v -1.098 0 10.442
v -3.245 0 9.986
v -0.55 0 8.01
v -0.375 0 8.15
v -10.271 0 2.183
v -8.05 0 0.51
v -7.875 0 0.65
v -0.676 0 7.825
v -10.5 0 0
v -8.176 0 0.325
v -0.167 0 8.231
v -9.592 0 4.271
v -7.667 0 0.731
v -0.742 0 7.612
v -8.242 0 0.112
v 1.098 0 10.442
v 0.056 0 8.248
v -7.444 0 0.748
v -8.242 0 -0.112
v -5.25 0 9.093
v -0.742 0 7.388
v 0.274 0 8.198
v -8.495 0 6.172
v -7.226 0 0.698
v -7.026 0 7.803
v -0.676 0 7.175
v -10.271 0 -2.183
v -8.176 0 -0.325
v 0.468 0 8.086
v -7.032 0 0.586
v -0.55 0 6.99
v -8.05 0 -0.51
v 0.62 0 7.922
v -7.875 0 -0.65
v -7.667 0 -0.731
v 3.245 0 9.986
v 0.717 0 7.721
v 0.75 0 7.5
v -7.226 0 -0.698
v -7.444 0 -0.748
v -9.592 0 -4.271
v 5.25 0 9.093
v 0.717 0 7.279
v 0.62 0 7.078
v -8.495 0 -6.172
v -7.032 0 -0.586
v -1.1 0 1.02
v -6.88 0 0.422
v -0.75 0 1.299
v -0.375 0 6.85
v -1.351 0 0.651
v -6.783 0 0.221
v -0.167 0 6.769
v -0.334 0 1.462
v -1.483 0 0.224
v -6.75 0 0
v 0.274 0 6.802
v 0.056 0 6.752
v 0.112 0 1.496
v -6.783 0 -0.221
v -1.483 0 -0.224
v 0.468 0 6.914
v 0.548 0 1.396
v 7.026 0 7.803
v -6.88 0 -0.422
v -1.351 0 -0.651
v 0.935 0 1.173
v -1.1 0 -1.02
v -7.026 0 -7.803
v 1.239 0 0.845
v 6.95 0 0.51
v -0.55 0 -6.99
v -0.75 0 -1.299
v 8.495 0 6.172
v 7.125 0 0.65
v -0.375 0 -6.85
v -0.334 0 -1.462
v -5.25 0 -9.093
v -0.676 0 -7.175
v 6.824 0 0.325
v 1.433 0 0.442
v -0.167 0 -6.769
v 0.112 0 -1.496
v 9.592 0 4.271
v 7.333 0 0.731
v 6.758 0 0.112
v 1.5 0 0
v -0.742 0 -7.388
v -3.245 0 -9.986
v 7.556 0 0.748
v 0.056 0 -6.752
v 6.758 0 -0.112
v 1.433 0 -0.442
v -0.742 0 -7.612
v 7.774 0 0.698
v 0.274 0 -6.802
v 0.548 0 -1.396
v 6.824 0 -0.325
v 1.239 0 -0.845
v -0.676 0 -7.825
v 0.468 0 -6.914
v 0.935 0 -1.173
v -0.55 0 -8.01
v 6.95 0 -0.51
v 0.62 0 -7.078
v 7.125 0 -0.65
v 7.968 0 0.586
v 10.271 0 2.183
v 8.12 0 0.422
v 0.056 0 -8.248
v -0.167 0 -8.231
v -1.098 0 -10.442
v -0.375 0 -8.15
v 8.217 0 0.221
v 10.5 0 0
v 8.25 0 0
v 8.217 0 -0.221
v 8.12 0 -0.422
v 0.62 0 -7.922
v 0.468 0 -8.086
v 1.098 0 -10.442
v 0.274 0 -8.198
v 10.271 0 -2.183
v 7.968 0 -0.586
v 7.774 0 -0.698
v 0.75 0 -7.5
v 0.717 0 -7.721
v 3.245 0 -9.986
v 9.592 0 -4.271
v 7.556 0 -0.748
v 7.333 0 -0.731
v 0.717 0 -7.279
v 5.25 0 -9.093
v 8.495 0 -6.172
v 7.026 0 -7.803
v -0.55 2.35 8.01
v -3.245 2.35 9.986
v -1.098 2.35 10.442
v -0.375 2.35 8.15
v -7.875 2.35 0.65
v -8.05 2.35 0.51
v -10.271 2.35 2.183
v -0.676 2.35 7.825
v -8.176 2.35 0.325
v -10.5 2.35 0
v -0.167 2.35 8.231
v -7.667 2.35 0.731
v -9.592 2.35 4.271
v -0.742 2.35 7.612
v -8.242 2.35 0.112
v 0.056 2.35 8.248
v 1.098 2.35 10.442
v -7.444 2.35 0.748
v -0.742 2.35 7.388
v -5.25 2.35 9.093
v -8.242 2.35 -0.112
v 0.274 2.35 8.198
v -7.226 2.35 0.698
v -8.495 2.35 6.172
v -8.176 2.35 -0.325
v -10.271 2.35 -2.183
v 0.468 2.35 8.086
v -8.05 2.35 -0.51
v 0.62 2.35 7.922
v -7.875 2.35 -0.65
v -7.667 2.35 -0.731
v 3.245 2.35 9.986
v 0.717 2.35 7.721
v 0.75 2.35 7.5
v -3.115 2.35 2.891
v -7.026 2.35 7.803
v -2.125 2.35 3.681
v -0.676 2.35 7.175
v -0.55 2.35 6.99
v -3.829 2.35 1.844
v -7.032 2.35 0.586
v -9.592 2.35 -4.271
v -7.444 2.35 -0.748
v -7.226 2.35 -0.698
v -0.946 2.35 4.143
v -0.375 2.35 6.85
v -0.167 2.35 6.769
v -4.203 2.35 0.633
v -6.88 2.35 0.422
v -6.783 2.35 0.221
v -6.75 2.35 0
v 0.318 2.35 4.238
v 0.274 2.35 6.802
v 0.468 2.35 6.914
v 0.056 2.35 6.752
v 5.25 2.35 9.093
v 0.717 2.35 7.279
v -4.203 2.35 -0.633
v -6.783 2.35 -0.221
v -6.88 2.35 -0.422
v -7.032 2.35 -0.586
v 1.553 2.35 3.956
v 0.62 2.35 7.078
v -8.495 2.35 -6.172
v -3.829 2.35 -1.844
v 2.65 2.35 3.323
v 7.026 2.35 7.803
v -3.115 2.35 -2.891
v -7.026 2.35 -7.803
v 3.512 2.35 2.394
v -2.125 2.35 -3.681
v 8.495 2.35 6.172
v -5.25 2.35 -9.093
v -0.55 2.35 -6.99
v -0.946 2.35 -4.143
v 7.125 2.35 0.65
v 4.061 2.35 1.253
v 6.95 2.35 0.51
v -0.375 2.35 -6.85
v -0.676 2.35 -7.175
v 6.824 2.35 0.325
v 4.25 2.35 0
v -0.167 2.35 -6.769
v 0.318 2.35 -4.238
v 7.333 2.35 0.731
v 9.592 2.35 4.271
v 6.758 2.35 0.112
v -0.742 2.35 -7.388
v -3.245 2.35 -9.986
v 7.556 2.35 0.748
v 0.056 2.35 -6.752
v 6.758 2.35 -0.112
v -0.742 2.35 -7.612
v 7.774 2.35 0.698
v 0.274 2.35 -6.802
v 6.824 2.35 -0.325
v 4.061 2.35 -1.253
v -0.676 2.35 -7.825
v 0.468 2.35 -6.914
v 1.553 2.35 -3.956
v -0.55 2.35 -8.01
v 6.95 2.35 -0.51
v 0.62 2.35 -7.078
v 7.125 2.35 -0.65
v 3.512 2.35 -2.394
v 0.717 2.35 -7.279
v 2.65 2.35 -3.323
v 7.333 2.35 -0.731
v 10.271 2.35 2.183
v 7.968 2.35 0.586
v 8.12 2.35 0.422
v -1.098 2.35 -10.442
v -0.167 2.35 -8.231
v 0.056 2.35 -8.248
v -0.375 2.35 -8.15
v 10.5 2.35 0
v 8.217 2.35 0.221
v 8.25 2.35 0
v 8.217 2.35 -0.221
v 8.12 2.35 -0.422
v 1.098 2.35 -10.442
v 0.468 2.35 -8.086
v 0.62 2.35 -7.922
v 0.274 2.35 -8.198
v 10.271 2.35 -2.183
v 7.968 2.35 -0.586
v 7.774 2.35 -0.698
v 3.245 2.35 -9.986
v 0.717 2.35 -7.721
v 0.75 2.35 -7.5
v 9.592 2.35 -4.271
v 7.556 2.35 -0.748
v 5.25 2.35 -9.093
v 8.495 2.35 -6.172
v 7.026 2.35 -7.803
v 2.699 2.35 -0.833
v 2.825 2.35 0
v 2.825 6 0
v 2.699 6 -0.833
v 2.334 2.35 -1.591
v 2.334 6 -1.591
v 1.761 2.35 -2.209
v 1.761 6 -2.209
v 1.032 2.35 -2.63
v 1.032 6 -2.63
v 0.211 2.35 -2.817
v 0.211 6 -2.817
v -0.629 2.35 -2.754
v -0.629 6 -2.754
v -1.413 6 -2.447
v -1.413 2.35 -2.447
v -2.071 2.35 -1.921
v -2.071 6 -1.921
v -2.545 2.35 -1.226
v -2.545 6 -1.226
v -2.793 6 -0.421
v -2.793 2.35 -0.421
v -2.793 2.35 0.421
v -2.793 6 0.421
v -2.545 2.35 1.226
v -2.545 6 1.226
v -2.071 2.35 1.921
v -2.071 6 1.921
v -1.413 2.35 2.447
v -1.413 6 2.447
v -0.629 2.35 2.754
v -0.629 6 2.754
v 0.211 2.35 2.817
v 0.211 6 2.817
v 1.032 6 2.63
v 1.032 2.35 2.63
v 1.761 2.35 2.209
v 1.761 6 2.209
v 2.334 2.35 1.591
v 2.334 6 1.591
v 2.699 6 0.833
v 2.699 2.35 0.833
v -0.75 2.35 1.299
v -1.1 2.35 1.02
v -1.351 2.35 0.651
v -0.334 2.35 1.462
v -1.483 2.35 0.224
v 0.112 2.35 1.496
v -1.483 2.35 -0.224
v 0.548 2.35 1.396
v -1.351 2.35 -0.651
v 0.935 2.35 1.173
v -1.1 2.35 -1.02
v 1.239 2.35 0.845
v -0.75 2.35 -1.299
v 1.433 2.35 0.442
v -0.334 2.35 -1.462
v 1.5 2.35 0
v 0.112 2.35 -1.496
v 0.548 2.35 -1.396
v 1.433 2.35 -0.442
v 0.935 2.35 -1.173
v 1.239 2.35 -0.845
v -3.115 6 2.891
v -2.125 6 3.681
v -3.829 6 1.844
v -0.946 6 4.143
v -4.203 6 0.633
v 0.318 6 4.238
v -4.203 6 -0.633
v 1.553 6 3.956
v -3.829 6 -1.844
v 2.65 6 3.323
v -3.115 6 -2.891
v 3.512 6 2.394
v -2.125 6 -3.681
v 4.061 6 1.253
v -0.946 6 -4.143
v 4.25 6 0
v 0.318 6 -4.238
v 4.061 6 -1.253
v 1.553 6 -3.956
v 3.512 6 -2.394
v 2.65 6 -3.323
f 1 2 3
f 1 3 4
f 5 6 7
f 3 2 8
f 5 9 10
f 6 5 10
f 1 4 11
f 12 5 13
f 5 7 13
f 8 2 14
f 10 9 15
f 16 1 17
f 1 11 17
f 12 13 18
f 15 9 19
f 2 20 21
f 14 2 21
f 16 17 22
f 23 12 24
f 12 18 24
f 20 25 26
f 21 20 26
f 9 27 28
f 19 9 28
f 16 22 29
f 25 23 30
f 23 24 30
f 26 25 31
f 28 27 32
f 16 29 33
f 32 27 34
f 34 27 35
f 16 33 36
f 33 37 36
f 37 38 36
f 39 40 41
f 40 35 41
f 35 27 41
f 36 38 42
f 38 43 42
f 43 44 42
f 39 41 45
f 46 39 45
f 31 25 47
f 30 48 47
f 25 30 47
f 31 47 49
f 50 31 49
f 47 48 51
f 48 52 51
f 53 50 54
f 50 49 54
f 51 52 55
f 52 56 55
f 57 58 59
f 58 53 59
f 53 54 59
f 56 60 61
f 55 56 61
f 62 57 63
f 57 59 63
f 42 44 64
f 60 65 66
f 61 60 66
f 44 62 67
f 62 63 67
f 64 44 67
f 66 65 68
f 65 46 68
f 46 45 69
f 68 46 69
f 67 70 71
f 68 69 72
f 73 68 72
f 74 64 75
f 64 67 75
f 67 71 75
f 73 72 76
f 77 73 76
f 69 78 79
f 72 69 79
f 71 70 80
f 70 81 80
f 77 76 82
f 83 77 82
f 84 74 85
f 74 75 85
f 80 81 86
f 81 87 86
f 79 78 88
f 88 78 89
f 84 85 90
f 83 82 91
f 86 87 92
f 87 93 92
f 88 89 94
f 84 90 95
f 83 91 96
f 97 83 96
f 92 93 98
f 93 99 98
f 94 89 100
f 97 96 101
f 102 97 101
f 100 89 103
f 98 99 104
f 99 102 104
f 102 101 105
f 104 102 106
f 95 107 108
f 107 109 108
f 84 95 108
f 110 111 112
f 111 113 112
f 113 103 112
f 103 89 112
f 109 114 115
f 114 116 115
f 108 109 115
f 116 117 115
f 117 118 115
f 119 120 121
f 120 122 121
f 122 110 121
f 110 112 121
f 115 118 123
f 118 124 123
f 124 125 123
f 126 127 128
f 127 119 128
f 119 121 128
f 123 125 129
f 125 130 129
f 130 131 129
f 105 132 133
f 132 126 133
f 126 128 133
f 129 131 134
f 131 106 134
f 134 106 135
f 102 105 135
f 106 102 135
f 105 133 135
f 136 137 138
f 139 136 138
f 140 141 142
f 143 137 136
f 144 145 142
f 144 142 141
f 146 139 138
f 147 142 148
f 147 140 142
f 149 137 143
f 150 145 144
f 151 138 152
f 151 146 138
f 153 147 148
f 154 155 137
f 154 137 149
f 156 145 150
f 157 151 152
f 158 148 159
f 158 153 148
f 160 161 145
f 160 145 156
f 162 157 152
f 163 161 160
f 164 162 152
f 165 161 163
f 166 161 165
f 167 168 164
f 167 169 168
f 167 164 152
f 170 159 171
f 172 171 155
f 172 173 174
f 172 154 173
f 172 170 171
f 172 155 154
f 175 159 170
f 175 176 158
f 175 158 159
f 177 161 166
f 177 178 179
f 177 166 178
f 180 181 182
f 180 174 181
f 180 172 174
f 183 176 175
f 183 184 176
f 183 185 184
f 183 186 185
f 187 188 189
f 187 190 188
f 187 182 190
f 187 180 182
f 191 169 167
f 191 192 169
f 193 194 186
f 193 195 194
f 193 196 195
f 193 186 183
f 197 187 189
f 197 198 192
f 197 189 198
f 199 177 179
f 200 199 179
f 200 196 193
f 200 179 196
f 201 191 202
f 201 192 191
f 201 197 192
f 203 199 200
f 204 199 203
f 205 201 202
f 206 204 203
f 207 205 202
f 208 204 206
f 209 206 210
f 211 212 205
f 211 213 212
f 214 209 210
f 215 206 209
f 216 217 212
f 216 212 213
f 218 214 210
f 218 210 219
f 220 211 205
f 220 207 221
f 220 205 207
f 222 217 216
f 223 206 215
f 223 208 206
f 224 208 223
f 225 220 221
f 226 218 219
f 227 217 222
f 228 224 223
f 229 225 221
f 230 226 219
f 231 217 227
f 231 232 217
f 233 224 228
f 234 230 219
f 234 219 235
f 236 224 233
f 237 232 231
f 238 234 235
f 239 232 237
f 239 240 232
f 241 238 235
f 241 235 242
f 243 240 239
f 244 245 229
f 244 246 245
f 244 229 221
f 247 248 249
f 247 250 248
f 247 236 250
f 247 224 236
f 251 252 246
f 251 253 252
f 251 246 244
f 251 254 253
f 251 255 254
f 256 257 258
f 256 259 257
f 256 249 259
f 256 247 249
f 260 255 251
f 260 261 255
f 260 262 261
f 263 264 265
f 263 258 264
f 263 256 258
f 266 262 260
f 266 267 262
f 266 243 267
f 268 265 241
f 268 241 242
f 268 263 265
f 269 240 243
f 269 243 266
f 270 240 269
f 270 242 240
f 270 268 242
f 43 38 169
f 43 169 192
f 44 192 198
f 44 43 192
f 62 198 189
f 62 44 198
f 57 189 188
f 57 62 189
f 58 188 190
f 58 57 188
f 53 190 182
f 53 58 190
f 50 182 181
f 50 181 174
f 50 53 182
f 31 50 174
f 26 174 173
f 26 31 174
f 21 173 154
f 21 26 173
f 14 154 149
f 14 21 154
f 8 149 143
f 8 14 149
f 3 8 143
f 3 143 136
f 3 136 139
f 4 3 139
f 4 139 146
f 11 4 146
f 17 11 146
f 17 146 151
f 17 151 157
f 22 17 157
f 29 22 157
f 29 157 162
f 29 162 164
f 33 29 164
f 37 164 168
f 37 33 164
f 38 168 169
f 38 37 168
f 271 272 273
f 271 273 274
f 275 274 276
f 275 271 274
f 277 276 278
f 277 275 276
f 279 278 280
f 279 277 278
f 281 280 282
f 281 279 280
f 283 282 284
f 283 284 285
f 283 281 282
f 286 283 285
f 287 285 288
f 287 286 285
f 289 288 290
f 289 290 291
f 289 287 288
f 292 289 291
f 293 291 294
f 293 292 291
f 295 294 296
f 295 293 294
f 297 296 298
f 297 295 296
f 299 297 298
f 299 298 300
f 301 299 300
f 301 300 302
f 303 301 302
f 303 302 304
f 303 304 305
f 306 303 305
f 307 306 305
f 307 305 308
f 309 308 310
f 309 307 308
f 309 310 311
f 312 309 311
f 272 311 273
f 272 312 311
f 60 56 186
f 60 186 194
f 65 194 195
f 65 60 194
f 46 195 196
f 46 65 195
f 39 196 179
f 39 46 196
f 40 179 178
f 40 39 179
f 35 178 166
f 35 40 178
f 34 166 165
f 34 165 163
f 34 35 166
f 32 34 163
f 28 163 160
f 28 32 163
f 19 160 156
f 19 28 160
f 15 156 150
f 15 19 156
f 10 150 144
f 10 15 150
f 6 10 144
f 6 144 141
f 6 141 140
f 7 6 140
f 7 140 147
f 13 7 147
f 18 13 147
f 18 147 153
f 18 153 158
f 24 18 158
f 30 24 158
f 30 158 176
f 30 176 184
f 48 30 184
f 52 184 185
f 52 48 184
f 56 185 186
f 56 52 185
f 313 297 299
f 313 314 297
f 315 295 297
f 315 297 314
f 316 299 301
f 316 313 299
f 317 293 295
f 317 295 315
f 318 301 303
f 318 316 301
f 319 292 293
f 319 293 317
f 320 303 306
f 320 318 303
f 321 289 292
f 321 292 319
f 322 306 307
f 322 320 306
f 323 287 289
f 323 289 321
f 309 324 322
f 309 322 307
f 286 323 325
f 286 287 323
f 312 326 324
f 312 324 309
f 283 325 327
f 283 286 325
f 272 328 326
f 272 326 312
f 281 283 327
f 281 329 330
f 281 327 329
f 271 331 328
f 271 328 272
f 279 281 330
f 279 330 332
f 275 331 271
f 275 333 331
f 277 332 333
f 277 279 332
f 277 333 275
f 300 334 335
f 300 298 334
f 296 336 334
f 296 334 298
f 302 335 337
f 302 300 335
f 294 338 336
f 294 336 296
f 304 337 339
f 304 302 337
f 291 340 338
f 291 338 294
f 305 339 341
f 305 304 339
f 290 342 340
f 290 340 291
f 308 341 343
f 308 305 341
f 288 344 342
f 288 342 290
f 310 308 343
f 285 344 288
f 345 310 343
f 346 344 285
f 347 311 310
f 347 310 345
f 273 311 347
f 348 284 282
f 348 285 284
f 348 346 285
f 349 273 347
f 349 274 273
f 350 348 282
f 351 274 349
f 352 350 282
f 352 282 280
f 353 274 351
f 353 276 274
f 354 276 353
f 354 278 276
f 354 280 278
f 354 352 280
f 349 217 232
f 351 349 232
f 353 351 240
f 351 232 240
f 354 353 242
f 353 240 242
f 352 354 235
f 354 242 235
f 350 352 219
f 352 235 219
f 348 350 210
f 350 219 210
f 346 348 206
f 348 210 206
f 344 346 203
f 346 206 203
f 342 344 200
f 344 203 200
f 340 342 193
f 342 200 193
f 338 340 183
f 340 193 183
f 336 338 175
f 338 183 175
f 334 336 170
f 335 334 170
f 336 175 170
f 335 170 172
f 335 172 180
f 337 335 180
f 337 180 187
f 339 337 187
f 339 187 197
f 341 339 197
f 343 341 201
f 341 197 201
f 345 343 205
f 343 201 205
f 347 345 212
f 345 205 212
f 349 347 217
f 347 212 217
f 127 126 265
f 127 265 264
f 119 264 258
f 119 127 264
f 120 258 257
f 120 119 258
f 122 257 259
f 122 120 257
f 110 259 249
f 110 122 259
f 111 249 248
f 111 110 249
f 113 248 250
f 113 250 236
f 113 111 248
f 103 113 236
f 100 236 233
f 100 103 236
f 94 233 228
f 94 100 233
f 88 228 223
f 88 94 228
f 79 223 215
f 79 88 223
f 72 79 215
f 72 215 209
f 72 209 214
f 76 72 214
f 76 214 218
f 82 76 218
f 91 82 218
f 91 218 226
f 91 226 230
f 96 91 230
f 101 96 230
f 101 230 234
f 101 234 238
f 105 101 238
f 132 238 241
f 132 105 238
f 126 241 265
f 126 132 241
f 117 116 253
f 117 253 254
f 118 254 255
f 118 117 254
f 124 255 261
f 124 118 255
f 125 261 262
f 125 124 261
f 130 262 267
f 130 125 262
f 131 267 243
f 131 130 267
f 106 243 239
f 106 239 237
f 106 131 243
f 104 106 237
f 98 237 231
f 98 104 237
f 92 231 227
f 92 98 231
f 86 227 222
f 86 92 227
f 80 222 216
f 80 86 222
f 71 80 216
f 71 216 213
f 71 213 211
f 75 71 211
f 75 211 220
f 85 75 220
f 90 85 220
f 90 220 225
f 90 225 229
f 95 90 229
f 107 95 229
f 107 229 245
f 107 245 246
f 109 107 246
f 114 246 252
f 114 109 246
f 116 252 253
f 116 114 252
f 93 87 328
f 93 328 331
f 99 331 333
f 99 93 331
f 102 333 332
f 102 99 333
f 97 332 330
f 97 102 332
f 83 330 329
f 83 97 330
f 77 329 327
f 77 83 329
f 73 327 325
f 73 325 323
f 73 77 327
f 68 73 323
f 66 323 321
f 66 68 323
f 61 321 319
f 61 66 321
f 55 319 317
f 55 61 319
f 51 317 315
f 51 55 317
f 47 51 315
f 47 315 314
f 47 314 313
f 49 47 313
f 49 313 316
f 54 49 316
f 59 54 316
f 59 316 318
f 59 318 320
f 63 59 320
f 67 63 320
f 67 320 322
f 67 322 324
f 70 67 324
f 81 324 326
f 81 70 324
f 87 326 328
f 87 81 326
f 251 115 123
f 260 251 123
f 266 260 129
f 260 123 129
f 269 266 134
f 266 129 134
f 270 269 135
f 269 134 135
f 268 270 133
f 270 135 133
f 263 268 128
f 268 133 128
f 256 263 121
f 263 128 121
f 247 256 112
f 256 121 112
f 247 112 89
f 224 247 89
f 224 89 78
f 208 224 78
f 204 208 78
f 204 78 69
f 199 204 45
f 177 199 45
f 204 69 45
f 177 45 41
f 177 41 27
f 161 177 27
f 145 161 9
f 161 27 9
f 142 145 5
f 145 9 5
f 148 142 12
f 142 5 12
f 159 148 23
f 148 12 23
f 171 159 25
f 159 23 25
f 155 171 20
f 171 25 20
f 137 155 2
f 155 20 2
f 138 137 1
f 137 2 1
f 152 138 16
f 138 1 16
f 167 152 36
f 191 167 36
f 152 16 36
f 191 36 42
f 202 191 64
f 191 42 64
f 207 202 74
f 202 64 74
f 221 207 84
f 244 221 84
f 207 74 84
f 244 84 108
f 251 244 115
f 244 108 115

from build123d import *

# Parameters (mm, degrees)
SKETCH1_R           = 10.5
SKETCH1_R_2         = 0.75
SKETCH1_R_3         = 1.5
BOSS_EXTRUDE1_DEPTH = 2.35
BOSS_EXTRUDE2_START = 2.35
SKETCH1_3_R         = 4.25
SKETCH1_3_R_2       = 2.825
BOSS_EXTRUDE2_DEPTH = 3.65


with BuildPart() as part:
    # Sketch1 → Boss-Extrude1 (new body)
    with BuildSketch(Plane(origin=(0, 0, 0), x_dir=(1, 0, 0), z_dir=(0, 1, 0))):
        Circle(SKETCH1_R)
        with Locations((-7.5, 0)):
            Circle(SKETCH1_R_2, mode=Mode.SUBTRACT)
        with Locations((0, 7.5)):
            Circle(SKETCH1_R_2, mode=Mode.SUBTRACT)
        with Locations((7.5, 0)):
            Circle(SKETCH1_R_2, mode=Mode.SUBTRACT)
        with Locations((0, -7.5)):
            Circle(SKETCH1_R_2, mode=Mode.SUBTRACT)
        Circle(SKETCH1_R_3, mode=Mode.SUBTRACT)
    extrude(amount=BOSS_EXTRUDE1_DEPTH)

    # Sketch1<3> → Boss-Extrude2 (add)
    with BuildSketch(Plane(origin=(0, 0, 0), x_dir=(1, 0, 0), z_dir=(0, 1, 0)).offset(BOSS_EXTRUDE2_START)):
        Circle(SKETCH1_3_R)
        Circle(SKETCH1_3_R_2, mode=Mode.SUBTRACT)
    extrude(amount=BOSS_EXTRUDE2_DEPTH)


solid = part.part
